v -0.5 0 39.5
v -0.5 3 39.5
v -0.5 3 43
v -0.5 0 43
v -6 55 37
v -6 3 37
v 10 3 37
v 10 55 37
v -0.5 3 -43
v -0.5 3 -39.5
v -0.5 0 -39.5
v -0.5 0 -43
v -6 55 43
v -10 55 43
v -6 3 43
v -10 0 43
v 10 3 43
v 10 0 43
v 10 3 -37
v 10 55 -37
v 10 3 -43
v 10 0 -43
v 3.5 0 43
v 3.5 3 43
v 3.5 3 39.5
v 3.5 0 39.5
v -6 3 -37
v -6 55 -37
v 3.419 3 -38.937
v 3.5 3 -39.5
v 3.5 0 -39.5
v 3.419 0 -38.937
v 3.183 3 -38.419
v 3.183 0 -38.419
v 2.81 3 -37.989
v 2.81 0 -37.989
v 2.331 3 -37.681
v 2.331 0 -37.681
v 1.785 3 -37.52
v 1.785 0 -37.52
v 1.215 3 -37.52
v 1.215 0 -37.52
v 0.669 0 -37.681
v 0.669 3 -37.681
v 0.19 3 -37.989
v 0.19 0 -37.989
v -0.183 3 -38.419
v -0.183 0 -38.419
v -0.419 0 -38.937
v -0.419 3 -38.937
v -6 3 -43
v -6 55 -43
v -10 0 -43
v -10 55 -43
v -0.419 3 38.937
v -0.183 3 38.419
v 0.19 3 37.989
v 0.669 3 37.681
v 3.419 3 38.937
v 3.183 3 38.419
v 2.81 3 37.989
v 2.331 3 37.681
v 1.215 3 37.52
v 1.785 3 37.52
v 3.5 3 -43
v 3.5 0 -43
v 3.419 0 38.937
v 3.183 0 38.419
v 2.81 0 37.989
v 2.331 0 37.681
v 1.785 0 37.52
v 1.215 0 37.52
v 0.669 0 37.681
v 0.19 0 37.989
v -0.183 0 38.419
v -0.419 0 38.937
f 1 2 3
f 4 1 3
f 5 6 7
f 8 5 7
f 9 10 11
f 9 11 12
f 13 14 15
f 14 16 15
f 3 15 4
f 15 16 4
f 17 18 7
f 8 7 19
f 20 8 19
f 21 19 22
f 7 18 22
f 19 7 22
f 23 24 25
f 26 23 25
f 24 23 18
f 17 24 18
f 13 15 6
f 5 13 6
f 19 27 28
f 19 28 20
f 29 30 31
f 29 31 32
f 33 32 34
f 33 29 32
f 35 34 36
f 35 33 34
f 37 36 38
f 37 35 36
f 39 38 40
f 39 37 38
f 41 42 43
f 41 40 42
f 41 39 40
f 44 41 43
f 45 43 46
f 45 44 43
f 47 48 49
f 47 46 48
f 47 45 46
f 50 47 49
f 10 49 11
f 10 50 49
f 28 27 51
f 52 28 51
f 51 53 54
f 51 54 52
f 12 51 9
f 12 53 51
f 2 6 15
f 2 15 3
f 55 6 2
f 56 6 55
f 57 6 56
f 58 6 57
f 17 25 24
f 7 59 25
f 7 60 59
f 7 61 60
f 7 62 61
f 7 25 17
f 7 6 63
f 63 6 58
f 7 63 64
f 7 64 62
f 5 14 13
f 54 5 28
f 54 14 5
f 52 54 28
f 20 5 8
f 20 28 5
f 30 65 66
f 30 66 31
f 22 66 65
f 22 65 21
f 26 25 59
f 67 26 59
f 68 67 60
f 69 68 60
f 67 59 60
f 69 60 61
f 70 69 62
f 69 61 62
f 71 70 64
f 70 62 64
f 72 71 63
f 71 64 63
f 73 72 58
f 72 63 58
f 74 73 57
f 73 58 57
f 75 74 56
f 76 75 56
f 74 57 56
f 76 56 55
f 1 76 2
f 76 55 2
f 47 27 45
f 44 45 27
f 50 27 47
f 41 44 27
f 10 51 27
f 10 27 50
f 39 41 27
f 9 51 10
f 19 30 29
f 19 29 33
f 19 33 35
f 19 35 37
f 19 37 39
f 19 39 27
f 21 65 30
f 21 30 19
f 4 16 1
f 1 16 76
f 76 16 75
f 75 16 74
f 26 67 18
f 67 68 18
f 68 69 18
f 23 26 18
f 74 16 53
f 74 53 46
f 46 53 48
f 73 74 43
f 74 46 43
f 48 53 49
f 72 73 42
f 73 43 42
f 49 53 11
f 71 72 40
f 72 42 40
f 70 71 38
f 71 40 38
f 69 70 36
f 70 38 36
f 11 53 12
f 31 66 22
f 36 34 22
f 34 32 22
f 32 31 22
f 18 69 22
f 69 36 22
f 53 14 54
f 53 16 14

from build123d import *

# Parameters (mm, degrees)
SKETCH1_W           = 20
SKETCH1_H           = 86
BOSS_EXTRUDE1_DEPTH = 3
CUT_EXTRUDE1_DEPTH  = 4
SKETCH3_W           = 4
SKETCH3_H           = 86
BOSS_EXTRUDE2_DEPTH = 52
SKETCH4_W           = 16
SKETCH4_H           = 74
BOSS_EXTRUDE3_DEPTH = 52


with BuildPart() as part:
    # Sketch1 → Boss-Extrude1 (new body)
    with BuildSketch(Plane(origin=(0, 0, 0), x_dir=(1, 0, 0), z_dir=(0, 1, 0))):
        Rectangle(SKETCH1_W, SKETCH1_H)
    extrude(amount=BOSS_EXTRUDE1_DEPTH)

    # Sketch2 → Cut-Extrude1 (cut, through all)
    with BuildSketch(Plane(origin=(0, 3, 0), x_dir=(1, 0, 0), z_dir=(0, 1, 0))):
        with BuildLine():
            Line((-0.5, 39.5), (-0.5, 43))
            Line((-0.5, 43), (3.5, 43))
            Line((3.5, 43), (3.5, 39.5))
            ThreePointArc((3.5, 39.5), (1.5, 37.5), (-0.5, 39.5))
        make_face()
        with BuildLine():
            Line((-0.5, -39.5), (-0.5, -43))
            Line((-0.5, -43), (3.5, -43))
            Line((3.5, -43), (3.5, -39.5))
            ThreePointArc((3.5, -39.5), (1.5, -37.5), (-0.5, -39.5))
        make_face()
    extrude(amount=-CUT_EXTRUDE1_DEPTH, mode=Mode.SUBTRACT)

    # Sketch3 → Boss-Extrude2 (add)
    with BuildSketch(Plane(origin=(0, 3, 0), x_dir=(1, 0, 0), z_dir=(0, 1, 0))):
        with Locations((-8, 0)):
            Rectangle(SKETCH3_W, SKETCH3_H)
    extrude(amount=BOSS_EXTRUDE2_DEPTH)

    # Sketch4 → Boss-Extrude3 (add)
    with BuildSketch(Plane(origin=(0, 3, 0), x_dir=(1, 0, 0), z_dir=(0, 1, 0))):
        with Locations((2, 0)):
            Rectangle(SKETCH4_W, SKETCH4_H)
    extrude(amount=BOSS_EXTRUDE3_DEPTH)


solid = part.part
